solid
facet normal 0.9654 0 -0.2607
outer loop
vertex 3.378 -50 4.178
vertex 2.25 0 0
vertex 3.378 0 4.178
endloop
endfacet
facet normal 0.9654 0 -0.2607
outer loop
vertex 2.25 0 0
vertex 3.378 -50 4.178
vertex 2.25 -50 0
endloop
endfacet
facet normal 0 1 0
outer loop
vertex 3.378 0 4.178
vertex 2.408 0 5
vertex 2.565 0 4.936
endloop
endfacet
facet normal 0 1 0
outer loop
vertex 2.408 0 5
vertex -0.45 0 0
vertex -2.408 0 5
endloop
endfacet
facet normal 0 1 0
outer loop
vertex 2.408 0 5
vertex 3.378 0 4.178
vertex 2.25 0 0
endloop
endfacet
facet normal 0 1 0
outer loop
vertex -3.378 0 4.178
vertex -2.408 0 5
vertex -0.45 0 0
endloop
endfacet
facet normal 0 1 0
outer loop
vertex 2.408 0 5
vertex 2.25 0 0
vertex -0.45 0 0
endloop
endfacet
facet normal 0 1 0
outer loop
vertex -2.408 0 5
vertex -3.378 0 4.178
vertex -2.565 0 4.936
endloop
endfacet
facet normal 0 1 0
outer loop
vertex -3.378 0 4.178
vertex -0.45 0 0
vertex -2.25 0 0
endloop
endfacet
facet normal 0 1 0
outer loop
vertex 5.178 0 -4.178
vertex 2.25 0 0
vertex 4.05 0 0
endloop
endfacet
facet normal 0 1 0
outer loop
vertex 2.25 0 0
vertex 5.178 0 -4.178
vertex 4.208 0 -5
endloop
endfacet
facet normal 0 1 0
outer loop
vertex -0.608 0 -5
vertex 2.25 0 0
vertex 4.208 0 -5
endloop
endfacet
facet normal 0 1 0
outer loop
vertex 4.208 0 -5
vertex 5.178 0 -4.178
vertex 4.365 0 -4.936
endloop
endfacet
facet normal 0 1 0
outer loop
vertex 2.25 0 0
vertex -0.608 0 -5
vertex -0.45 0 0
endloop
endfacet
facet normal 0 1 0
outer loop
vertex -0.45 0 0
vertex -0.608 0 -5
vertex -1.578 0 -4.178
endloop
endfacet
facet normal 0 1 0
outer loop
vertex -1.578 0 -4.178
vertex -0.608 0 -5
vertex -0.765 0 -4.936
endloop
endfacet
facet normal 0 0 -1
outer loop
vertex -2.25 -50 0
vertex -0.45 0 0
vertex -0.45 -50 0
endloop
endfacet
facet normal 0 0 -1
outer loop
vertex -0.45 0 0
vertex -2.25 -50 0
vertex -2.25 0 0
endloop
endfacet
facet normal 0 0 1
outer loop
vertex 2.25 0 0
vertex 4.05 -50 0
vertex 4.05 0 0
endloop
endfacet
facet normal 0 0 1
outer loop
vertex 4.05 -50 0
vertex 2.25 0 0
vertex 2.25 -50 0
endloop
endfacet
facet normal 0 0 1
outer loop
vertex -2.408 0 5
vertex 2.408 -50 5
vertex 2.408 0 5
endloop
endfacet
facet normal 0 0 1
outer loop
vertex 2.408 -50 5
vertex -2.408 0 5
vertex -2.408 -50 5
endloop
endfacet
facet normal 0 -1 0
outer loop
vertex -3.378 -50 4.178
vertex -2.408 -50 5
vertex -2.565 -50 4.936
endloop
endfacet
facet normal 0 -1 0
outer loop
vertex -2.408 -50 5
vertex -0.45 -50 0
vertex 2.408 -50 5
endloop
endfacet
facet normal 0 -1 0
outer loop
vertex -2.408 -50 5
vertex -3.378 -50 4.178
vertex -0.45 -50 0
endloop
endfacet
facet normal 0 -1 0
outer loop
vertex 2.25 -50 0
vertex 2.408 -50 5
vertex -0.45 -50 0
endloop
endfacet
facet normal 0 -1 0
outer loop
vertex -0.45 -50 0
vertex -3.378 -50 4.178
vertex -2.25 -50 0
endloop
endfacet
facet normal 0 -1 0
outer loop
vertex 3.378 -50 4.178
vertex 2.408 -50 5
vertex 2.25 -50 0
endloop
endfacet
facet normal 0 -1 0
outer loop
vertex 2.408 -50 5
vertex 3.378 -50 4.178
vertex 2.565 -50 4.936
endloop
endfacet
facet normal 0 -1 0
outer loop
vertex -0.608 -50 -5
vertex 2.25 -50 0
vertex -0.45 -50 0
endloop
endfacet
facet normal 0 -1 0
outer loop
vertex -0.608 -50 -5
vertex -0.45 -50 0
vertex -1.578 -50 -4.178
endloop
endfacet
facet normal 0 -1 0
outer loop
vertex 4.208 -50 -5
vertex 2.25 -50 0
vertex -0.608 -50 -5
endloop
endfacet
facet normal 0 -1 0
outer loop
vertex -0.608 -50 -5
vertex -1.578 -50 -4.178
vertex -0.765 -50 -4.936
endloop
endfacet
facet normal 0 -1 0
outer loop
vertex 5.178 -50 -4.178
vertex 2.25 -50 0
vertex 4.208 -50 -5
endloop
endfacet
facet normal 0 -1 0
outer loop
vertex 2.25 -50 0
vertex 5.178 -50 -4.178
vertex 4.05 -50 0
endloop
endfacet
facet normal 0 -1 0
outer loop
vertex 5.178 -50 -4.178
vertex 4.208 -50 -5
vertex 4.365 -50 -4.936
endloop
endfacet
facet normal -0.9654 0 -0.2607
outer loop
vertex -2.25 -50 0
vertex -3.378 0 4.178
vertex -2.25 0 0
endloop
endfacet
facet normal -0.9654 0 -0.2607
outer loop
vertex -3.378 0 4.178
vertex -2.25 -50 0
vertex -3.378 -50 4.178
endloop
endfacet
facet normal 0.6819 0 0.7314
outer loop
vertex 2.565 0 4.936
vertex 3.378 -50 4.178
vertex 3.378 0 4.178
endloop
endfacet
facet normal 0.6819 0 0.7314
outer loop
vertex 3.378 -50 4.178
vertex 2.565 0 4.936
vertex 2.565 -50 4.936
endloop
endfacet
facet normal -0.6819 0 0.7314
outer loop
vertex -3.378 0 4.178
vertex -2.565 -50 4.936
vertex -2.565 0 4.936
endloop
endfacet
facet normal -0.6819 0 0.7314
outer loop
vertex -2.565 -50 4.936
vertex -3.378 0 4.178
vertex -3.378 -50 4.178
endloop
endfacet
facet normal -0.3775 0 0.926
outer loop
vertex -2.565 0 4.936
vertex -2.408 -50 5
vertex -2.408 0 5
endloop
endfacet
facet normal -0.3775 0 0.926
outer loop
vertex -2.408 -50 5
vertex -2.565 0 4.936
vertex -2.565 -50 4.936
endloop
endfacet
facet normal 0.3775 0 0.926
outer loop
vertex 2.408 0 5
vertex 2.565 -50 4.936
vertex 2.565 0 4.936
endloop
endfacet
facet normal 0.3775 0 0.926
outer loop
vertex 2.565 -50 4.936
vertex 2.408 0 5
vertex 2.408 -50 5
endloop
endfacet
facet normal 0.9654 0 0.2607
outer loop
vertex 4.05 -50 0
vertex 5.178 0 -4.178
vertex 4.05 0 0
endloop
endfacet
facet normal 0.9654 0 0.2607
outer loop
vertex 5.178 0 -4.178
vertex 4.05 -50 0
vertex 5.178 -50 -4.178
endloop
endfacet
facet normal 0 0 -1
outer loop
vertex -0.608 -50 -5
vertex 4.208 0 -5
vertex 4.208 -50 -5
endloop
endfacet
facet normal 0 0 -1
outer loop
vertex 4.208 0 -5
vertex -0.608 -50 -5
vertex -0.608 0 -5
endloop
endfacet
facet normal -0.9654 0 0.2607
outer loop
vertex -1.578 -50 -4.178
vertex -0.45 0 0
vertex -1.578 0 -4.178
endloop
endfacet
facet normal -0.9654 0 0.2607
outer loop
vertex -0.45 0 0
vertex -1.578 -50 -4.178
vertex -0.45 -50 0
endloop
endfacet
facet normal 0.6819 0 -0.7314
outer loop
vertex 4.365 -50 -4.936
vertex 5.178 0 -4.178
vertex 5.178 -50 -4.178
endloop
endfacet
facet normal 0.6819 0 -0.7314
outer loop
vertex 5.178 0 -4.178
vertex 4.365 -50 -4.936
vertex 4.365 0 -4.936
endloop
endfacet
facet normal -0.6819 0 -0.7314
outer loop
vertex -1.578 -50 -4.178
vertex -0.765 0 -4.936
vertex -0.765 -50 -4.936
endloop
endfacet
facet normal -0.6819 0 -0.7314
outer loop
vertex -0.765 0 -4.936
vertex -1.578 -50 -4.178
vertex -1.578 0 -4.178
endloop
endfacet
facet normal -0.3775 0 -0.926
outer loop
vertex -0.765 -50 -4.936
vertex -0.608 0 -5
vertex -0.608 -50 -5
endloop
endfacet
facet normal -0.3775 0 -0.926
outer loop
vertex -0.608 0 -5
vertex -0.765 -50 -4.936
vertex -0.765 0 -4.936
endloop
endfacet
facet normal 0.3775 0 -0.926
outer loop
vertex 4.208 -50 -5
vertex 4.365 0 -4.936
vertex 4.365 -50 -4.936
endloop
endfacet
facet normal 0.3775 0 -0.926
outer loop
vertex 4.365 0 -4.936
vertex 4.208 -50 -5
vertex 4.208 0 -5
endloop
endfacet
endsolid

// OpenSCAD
// file: ../../globals.scad
/*
Most things in this file is represented as one millimeter, so keep that in mind while changing things.
Some of the setting are not mm but at variables that you can set, such as 2*x=2x and you are setting what x is.
I will try to specify when things are variables and not exact measurements.
*/

//Virindi settings
dovetail_male_width_scale = 0.98;
dovetail_male_height_scale = 0.91;

obj_leg = 30;
leg_length = 5.5;
small_number = 0.001;
metal_core_rode_global = 5;


///////////////// number of holes /////////////////////
z_hole_number = 8;
other_holes = 8;

///////////////// Pins /////////////////////

//pins that poke out
ball_size = 10;
pin_height = 20;
pin_diameter = 6;


//holes
hole_ball_size = ball_size;
hole_pin_height = pin_height;
hole_pin_diameter = pin_diameter;

///////////////// Z THINGS /////////////////////

berring_slot_width = 7.5;
berring_slot_depth = 6.5;
metal_core_rode = 5;

///////////////// X THINGS /////////////////////

//male dove tails
max_width=8;
min_width=5;
depth=5;
height=obj_leg/2;

//female dove tails, this is found on the y mounts
girl_max_width=11;
girl_min_width=5;
girl_depth=5;
girl_height=obj_leg;


///////////////// Y THINGS /////////////////////
/*
The Y is so normal that all of those global variables at the top should change all of the setting in it, this section is set her incase there are variables set in the future development of this project.
*/
// file: ../../include.scad
//////////////////      END SECTION       //////////////////

	module added_pins(){
		difference(){
			union(){
				translate([30/(15/4),obj_leg*leg_length,30/(15/4)]) pin();
				translate([30/(15/4)+14.5,obj_leg*leg_length,30/(15/4)+14]) pin();
			}
			union(){
							translate([30/(15/4)+13.5,obj_leg*leg_length-20,30/(15/4)+5])cube(size=[2,40,15]);
							translate([30/(15/4)+7.5,obj_leg*leg_length-20,30/(15/4)+15])rotate([0,90,0]) cube(size=[2,40,15]);	

							translate([30/(15/4)-1,obj_leg*leg_length-20,30/(15/4)-8])cube(size=[2,40,15]);
							translate([30/(15/4)-10,obj_leg*leg_length-20,30/(15/4)+1])rotate([0,90,0]) cube(size=[2,40,15]);
			}
		}
	}
	module taken_pins() {
		translate([30/(15/4)+14,obj_leg*leg_length-10,30/(15/4)]) mirror_pin();
		translate([30/(15/4),obj_leg*leg_length-10,30/(15/4)+15]) mirror_pin();
	}


//////////////////      OTHER STUFF       //////////////////

	module holes() {
		rotate([0,0,90]) for(y=[0:other_holes])
		translate([obj_leg+y*15,-15.5,7.5]) union() {
			translate([7.5,0,15]) hole_up();
			hole_down();
		}
	}
	module extend_holes() {
	module top(){
		rotate([0,0,90]) for(y=[0:other_holes+1])
		translate([(30/4)+y*15,-15.5,7.5]) union() {
			translate([7.5,0,15]) hole_up();
		}
	}
	module bottom(){
		rotate([0,0,90]) for(y=[0:other_holes+2])
		translate([(30/4)+y*15,-15.5,7.5]) union() {
			hole_down();
		
}
	}
	union(){
		top();
		bottom();
	}
	}

	module hole() {
		union() {
			rotate([90, 90, 0]) cylinder(h=40, d=hole_pin_diameter, center=true);
			translate([0,7.5,0]) sphere(d=hole_ball_size);
			translate([0,-6,0]) sphere(d=hole_ball_size);
		}
	}
	module hole_up() {
		union() {
			rotate([90, 90, 0]) cylinder(h=40, d=hole_pin_diameter, center=true);
			translate([0,7.5,10]) cylinder(h=hole_pin_height, d=hole_pin_diameter, center=true);
			translate([0,-6,10]) cylinder(h=hole_pin_height, d=hole_pin_diameter, center=true);
			translate([0,7.5,0]) sphere(d=hole_ball_size);
			translate([0,-6,0]) sphere(d=hole_ball_size);
		}
	}
	module hole_down() {
		union() {
			rotate([90, 90, 0]) cylinder(h=40, d=hole_pin_diameter, center=true);
			translate([0,7.5,-10]) cylinder(h=hole_pin_height, d=hole_pin_diameter, center=true);
			translate([0,-6,-10]) cylinder(h=hole_pin_height, d=hole_pin_diameter, center=true);
			translate([0,7.5,0]) sphere(d=hole_ball_size);
			translate([0,-6,0]) sphere(d=hole_ball_size);
		}
	}
	module pin() {
		union() {
			rotate([90, 90, 0]) cylinder(h=pin_height, d=pin_diameter, center=true);
			translate([0,7.5,0]) sphere(d=ball_size);
		}
	}

	module mirror_pin() {
		rotate([90, 90, 0]) cylinder(h=hole_pin_height+small_number, d=hole_pin_diameter, center=true);
		translate([0,-(pin_height-(ball_size/2)),0]) sphere(d=ball_size);
	}


//////////////////      SOME RACK AND Z THINGS       //////////////////

module z_holes() {
    rotate([0,-90,0]) for(z=[0:z_hole_number])
    translate([22.5+z*15,16,-12])
        hole();
}

module pin_cuts() {
	union(){
		cube(size=[2,10,40], center=true);
		rotate([0,0,90]) cube(size=[2,10,40], center=true);
	}
}
module pin_uncut() {
	union(){
		rotate([0, 0, 90]) cylinder(h=hole_pin_height, d=hole_pin_diameter, center=true);
		translate([0,0,10]) sphere(d=ball_hole);
	}
}


module pin_out() {
	union(){
		rotate([0, 0, 90]) cylinder(h=pin_height, d=pin_diameter, center=true);
		translate([0,0,10]) sphere(d= ball_size);
	}
}


module pins_z(){
	difference() {
		pin_out();
		pin_cuts();
	}
}
//////////////////      RACK AND SLIDE     ///////////////////

module straight_pins() {
	for(z=[0:((((obj_leg*leg_length)*2)-(obj_leg*2))/3)/14.5]) rotate([-90,0,0]) translate([z*15,30/(15/4),14]) pins_z();
	for(z=[0:((((obj_leg*leg_length)*2)-(obj_leg*2))/3)/14.5]) rotate([-90,0,0]) translate([z*15,30/(15/4)-14,14]) pins_z();
}
module stagger_pins() {
	for(z=[0:((((obj_leg*leg_length)*2)-(obj_leg*2))/3)/14.5]) rotate([-90,0,0]) translate([z*15,30/(15/4),14]) pins_z();
	for(z=[0:((((obj_leg*leg_length)*2)-(obj_leg*2))/3)/14.5]) rotate([-90,0,0]) translate([z*15+7,30/(15/4)-14,14]) pins_z();
}


//////////////////      DOVE TAIL       //////////////////

module male_dovetail(height) {
	dovetail_3d(max_width,min_width,depth,height);
}

module dovetail_3d(max_width=11, min_width=5, depth=5, height=30) {
	linear_extrude(height=height, convexity=2)
		dovetail_2d(max_width,min_width,depth);
}

module dovetail_2d(max_width=11, min_width=5, depth=5) {
	angle=atan((max_width/2-min_width/2)/depth);
	echo("angle: ", angle);
	polygon(paths=[[0,1,2,3,0]], points=[[-min_width/2,0], [-max_width/2,depth], [max_width/2, depth], [min_width/2,0]]);
}

//bow tie
	module tie_end(height){
				rotate([0,0,0]) translate([0,-0.01,((obj_leg/2)/2)]) male_dovetail(height);
				rotate([0,90,0]) translate([0,-0.01,((obj_leg/2)/2)]) male_dovetail(height);
				rotate([0,180,0]) translate([0,-0.01,((obj_leg/2)/2)]) male_dovetail(height);
				rotate([0,-90,0]) translate([0,-0.01,((obj_leg/2)/2)]) male_dovetail(height);
	}

module bow_support(){
	difference(){
		intersection(){
			translate([-15,0,-15]) cube([30,9,30]);
			scale([1.05,1.05,1.05]) rotate([0,45,0]) tie_end();
		}
		cube([29.2,29.2,29.2], center=true);
	}
}

	module wrap(units){
	for (y = [-1:units-2]) // two iterations, z = -1, z = 1
	{
			translate([15, (y*30)+15, 15]){
			for (r = [0:4]) // two iterations, z = -1, z = 1
			{
				rotate([0,r*90,0]) translate([0,15,15]) rotate([-90,0,0])male_dovetail(height=30);
			}
		}
	}
	}
// main file
length = 50;
tilt_level = 1.1;
scaling_x = .9;
scaling_y = 1;
scaling_z = 1;
include <../../include.scad>;
include <../../globals.scad>;

obj_leg= 12;

// unaligend version of bow tie. Why? I printed twist corners that do not match the extention parts, so this is the fix :3

module bow_tie_rounded() {
    intersection () {
        male_dovetail(height=length);
        cylinder(r=5.7, h=200);
    }
}

module bow_tie_master(){
	union(){
        translate([2,0,0]) mirror([0,1,0]){
            bow_tie_rounded();
        }
        bow_tie_rounded();
	}
}

// do the part
scale([scaling_x,scaling_y,scaling_z]) rotate([90,0,0]) bow_tie_master();
